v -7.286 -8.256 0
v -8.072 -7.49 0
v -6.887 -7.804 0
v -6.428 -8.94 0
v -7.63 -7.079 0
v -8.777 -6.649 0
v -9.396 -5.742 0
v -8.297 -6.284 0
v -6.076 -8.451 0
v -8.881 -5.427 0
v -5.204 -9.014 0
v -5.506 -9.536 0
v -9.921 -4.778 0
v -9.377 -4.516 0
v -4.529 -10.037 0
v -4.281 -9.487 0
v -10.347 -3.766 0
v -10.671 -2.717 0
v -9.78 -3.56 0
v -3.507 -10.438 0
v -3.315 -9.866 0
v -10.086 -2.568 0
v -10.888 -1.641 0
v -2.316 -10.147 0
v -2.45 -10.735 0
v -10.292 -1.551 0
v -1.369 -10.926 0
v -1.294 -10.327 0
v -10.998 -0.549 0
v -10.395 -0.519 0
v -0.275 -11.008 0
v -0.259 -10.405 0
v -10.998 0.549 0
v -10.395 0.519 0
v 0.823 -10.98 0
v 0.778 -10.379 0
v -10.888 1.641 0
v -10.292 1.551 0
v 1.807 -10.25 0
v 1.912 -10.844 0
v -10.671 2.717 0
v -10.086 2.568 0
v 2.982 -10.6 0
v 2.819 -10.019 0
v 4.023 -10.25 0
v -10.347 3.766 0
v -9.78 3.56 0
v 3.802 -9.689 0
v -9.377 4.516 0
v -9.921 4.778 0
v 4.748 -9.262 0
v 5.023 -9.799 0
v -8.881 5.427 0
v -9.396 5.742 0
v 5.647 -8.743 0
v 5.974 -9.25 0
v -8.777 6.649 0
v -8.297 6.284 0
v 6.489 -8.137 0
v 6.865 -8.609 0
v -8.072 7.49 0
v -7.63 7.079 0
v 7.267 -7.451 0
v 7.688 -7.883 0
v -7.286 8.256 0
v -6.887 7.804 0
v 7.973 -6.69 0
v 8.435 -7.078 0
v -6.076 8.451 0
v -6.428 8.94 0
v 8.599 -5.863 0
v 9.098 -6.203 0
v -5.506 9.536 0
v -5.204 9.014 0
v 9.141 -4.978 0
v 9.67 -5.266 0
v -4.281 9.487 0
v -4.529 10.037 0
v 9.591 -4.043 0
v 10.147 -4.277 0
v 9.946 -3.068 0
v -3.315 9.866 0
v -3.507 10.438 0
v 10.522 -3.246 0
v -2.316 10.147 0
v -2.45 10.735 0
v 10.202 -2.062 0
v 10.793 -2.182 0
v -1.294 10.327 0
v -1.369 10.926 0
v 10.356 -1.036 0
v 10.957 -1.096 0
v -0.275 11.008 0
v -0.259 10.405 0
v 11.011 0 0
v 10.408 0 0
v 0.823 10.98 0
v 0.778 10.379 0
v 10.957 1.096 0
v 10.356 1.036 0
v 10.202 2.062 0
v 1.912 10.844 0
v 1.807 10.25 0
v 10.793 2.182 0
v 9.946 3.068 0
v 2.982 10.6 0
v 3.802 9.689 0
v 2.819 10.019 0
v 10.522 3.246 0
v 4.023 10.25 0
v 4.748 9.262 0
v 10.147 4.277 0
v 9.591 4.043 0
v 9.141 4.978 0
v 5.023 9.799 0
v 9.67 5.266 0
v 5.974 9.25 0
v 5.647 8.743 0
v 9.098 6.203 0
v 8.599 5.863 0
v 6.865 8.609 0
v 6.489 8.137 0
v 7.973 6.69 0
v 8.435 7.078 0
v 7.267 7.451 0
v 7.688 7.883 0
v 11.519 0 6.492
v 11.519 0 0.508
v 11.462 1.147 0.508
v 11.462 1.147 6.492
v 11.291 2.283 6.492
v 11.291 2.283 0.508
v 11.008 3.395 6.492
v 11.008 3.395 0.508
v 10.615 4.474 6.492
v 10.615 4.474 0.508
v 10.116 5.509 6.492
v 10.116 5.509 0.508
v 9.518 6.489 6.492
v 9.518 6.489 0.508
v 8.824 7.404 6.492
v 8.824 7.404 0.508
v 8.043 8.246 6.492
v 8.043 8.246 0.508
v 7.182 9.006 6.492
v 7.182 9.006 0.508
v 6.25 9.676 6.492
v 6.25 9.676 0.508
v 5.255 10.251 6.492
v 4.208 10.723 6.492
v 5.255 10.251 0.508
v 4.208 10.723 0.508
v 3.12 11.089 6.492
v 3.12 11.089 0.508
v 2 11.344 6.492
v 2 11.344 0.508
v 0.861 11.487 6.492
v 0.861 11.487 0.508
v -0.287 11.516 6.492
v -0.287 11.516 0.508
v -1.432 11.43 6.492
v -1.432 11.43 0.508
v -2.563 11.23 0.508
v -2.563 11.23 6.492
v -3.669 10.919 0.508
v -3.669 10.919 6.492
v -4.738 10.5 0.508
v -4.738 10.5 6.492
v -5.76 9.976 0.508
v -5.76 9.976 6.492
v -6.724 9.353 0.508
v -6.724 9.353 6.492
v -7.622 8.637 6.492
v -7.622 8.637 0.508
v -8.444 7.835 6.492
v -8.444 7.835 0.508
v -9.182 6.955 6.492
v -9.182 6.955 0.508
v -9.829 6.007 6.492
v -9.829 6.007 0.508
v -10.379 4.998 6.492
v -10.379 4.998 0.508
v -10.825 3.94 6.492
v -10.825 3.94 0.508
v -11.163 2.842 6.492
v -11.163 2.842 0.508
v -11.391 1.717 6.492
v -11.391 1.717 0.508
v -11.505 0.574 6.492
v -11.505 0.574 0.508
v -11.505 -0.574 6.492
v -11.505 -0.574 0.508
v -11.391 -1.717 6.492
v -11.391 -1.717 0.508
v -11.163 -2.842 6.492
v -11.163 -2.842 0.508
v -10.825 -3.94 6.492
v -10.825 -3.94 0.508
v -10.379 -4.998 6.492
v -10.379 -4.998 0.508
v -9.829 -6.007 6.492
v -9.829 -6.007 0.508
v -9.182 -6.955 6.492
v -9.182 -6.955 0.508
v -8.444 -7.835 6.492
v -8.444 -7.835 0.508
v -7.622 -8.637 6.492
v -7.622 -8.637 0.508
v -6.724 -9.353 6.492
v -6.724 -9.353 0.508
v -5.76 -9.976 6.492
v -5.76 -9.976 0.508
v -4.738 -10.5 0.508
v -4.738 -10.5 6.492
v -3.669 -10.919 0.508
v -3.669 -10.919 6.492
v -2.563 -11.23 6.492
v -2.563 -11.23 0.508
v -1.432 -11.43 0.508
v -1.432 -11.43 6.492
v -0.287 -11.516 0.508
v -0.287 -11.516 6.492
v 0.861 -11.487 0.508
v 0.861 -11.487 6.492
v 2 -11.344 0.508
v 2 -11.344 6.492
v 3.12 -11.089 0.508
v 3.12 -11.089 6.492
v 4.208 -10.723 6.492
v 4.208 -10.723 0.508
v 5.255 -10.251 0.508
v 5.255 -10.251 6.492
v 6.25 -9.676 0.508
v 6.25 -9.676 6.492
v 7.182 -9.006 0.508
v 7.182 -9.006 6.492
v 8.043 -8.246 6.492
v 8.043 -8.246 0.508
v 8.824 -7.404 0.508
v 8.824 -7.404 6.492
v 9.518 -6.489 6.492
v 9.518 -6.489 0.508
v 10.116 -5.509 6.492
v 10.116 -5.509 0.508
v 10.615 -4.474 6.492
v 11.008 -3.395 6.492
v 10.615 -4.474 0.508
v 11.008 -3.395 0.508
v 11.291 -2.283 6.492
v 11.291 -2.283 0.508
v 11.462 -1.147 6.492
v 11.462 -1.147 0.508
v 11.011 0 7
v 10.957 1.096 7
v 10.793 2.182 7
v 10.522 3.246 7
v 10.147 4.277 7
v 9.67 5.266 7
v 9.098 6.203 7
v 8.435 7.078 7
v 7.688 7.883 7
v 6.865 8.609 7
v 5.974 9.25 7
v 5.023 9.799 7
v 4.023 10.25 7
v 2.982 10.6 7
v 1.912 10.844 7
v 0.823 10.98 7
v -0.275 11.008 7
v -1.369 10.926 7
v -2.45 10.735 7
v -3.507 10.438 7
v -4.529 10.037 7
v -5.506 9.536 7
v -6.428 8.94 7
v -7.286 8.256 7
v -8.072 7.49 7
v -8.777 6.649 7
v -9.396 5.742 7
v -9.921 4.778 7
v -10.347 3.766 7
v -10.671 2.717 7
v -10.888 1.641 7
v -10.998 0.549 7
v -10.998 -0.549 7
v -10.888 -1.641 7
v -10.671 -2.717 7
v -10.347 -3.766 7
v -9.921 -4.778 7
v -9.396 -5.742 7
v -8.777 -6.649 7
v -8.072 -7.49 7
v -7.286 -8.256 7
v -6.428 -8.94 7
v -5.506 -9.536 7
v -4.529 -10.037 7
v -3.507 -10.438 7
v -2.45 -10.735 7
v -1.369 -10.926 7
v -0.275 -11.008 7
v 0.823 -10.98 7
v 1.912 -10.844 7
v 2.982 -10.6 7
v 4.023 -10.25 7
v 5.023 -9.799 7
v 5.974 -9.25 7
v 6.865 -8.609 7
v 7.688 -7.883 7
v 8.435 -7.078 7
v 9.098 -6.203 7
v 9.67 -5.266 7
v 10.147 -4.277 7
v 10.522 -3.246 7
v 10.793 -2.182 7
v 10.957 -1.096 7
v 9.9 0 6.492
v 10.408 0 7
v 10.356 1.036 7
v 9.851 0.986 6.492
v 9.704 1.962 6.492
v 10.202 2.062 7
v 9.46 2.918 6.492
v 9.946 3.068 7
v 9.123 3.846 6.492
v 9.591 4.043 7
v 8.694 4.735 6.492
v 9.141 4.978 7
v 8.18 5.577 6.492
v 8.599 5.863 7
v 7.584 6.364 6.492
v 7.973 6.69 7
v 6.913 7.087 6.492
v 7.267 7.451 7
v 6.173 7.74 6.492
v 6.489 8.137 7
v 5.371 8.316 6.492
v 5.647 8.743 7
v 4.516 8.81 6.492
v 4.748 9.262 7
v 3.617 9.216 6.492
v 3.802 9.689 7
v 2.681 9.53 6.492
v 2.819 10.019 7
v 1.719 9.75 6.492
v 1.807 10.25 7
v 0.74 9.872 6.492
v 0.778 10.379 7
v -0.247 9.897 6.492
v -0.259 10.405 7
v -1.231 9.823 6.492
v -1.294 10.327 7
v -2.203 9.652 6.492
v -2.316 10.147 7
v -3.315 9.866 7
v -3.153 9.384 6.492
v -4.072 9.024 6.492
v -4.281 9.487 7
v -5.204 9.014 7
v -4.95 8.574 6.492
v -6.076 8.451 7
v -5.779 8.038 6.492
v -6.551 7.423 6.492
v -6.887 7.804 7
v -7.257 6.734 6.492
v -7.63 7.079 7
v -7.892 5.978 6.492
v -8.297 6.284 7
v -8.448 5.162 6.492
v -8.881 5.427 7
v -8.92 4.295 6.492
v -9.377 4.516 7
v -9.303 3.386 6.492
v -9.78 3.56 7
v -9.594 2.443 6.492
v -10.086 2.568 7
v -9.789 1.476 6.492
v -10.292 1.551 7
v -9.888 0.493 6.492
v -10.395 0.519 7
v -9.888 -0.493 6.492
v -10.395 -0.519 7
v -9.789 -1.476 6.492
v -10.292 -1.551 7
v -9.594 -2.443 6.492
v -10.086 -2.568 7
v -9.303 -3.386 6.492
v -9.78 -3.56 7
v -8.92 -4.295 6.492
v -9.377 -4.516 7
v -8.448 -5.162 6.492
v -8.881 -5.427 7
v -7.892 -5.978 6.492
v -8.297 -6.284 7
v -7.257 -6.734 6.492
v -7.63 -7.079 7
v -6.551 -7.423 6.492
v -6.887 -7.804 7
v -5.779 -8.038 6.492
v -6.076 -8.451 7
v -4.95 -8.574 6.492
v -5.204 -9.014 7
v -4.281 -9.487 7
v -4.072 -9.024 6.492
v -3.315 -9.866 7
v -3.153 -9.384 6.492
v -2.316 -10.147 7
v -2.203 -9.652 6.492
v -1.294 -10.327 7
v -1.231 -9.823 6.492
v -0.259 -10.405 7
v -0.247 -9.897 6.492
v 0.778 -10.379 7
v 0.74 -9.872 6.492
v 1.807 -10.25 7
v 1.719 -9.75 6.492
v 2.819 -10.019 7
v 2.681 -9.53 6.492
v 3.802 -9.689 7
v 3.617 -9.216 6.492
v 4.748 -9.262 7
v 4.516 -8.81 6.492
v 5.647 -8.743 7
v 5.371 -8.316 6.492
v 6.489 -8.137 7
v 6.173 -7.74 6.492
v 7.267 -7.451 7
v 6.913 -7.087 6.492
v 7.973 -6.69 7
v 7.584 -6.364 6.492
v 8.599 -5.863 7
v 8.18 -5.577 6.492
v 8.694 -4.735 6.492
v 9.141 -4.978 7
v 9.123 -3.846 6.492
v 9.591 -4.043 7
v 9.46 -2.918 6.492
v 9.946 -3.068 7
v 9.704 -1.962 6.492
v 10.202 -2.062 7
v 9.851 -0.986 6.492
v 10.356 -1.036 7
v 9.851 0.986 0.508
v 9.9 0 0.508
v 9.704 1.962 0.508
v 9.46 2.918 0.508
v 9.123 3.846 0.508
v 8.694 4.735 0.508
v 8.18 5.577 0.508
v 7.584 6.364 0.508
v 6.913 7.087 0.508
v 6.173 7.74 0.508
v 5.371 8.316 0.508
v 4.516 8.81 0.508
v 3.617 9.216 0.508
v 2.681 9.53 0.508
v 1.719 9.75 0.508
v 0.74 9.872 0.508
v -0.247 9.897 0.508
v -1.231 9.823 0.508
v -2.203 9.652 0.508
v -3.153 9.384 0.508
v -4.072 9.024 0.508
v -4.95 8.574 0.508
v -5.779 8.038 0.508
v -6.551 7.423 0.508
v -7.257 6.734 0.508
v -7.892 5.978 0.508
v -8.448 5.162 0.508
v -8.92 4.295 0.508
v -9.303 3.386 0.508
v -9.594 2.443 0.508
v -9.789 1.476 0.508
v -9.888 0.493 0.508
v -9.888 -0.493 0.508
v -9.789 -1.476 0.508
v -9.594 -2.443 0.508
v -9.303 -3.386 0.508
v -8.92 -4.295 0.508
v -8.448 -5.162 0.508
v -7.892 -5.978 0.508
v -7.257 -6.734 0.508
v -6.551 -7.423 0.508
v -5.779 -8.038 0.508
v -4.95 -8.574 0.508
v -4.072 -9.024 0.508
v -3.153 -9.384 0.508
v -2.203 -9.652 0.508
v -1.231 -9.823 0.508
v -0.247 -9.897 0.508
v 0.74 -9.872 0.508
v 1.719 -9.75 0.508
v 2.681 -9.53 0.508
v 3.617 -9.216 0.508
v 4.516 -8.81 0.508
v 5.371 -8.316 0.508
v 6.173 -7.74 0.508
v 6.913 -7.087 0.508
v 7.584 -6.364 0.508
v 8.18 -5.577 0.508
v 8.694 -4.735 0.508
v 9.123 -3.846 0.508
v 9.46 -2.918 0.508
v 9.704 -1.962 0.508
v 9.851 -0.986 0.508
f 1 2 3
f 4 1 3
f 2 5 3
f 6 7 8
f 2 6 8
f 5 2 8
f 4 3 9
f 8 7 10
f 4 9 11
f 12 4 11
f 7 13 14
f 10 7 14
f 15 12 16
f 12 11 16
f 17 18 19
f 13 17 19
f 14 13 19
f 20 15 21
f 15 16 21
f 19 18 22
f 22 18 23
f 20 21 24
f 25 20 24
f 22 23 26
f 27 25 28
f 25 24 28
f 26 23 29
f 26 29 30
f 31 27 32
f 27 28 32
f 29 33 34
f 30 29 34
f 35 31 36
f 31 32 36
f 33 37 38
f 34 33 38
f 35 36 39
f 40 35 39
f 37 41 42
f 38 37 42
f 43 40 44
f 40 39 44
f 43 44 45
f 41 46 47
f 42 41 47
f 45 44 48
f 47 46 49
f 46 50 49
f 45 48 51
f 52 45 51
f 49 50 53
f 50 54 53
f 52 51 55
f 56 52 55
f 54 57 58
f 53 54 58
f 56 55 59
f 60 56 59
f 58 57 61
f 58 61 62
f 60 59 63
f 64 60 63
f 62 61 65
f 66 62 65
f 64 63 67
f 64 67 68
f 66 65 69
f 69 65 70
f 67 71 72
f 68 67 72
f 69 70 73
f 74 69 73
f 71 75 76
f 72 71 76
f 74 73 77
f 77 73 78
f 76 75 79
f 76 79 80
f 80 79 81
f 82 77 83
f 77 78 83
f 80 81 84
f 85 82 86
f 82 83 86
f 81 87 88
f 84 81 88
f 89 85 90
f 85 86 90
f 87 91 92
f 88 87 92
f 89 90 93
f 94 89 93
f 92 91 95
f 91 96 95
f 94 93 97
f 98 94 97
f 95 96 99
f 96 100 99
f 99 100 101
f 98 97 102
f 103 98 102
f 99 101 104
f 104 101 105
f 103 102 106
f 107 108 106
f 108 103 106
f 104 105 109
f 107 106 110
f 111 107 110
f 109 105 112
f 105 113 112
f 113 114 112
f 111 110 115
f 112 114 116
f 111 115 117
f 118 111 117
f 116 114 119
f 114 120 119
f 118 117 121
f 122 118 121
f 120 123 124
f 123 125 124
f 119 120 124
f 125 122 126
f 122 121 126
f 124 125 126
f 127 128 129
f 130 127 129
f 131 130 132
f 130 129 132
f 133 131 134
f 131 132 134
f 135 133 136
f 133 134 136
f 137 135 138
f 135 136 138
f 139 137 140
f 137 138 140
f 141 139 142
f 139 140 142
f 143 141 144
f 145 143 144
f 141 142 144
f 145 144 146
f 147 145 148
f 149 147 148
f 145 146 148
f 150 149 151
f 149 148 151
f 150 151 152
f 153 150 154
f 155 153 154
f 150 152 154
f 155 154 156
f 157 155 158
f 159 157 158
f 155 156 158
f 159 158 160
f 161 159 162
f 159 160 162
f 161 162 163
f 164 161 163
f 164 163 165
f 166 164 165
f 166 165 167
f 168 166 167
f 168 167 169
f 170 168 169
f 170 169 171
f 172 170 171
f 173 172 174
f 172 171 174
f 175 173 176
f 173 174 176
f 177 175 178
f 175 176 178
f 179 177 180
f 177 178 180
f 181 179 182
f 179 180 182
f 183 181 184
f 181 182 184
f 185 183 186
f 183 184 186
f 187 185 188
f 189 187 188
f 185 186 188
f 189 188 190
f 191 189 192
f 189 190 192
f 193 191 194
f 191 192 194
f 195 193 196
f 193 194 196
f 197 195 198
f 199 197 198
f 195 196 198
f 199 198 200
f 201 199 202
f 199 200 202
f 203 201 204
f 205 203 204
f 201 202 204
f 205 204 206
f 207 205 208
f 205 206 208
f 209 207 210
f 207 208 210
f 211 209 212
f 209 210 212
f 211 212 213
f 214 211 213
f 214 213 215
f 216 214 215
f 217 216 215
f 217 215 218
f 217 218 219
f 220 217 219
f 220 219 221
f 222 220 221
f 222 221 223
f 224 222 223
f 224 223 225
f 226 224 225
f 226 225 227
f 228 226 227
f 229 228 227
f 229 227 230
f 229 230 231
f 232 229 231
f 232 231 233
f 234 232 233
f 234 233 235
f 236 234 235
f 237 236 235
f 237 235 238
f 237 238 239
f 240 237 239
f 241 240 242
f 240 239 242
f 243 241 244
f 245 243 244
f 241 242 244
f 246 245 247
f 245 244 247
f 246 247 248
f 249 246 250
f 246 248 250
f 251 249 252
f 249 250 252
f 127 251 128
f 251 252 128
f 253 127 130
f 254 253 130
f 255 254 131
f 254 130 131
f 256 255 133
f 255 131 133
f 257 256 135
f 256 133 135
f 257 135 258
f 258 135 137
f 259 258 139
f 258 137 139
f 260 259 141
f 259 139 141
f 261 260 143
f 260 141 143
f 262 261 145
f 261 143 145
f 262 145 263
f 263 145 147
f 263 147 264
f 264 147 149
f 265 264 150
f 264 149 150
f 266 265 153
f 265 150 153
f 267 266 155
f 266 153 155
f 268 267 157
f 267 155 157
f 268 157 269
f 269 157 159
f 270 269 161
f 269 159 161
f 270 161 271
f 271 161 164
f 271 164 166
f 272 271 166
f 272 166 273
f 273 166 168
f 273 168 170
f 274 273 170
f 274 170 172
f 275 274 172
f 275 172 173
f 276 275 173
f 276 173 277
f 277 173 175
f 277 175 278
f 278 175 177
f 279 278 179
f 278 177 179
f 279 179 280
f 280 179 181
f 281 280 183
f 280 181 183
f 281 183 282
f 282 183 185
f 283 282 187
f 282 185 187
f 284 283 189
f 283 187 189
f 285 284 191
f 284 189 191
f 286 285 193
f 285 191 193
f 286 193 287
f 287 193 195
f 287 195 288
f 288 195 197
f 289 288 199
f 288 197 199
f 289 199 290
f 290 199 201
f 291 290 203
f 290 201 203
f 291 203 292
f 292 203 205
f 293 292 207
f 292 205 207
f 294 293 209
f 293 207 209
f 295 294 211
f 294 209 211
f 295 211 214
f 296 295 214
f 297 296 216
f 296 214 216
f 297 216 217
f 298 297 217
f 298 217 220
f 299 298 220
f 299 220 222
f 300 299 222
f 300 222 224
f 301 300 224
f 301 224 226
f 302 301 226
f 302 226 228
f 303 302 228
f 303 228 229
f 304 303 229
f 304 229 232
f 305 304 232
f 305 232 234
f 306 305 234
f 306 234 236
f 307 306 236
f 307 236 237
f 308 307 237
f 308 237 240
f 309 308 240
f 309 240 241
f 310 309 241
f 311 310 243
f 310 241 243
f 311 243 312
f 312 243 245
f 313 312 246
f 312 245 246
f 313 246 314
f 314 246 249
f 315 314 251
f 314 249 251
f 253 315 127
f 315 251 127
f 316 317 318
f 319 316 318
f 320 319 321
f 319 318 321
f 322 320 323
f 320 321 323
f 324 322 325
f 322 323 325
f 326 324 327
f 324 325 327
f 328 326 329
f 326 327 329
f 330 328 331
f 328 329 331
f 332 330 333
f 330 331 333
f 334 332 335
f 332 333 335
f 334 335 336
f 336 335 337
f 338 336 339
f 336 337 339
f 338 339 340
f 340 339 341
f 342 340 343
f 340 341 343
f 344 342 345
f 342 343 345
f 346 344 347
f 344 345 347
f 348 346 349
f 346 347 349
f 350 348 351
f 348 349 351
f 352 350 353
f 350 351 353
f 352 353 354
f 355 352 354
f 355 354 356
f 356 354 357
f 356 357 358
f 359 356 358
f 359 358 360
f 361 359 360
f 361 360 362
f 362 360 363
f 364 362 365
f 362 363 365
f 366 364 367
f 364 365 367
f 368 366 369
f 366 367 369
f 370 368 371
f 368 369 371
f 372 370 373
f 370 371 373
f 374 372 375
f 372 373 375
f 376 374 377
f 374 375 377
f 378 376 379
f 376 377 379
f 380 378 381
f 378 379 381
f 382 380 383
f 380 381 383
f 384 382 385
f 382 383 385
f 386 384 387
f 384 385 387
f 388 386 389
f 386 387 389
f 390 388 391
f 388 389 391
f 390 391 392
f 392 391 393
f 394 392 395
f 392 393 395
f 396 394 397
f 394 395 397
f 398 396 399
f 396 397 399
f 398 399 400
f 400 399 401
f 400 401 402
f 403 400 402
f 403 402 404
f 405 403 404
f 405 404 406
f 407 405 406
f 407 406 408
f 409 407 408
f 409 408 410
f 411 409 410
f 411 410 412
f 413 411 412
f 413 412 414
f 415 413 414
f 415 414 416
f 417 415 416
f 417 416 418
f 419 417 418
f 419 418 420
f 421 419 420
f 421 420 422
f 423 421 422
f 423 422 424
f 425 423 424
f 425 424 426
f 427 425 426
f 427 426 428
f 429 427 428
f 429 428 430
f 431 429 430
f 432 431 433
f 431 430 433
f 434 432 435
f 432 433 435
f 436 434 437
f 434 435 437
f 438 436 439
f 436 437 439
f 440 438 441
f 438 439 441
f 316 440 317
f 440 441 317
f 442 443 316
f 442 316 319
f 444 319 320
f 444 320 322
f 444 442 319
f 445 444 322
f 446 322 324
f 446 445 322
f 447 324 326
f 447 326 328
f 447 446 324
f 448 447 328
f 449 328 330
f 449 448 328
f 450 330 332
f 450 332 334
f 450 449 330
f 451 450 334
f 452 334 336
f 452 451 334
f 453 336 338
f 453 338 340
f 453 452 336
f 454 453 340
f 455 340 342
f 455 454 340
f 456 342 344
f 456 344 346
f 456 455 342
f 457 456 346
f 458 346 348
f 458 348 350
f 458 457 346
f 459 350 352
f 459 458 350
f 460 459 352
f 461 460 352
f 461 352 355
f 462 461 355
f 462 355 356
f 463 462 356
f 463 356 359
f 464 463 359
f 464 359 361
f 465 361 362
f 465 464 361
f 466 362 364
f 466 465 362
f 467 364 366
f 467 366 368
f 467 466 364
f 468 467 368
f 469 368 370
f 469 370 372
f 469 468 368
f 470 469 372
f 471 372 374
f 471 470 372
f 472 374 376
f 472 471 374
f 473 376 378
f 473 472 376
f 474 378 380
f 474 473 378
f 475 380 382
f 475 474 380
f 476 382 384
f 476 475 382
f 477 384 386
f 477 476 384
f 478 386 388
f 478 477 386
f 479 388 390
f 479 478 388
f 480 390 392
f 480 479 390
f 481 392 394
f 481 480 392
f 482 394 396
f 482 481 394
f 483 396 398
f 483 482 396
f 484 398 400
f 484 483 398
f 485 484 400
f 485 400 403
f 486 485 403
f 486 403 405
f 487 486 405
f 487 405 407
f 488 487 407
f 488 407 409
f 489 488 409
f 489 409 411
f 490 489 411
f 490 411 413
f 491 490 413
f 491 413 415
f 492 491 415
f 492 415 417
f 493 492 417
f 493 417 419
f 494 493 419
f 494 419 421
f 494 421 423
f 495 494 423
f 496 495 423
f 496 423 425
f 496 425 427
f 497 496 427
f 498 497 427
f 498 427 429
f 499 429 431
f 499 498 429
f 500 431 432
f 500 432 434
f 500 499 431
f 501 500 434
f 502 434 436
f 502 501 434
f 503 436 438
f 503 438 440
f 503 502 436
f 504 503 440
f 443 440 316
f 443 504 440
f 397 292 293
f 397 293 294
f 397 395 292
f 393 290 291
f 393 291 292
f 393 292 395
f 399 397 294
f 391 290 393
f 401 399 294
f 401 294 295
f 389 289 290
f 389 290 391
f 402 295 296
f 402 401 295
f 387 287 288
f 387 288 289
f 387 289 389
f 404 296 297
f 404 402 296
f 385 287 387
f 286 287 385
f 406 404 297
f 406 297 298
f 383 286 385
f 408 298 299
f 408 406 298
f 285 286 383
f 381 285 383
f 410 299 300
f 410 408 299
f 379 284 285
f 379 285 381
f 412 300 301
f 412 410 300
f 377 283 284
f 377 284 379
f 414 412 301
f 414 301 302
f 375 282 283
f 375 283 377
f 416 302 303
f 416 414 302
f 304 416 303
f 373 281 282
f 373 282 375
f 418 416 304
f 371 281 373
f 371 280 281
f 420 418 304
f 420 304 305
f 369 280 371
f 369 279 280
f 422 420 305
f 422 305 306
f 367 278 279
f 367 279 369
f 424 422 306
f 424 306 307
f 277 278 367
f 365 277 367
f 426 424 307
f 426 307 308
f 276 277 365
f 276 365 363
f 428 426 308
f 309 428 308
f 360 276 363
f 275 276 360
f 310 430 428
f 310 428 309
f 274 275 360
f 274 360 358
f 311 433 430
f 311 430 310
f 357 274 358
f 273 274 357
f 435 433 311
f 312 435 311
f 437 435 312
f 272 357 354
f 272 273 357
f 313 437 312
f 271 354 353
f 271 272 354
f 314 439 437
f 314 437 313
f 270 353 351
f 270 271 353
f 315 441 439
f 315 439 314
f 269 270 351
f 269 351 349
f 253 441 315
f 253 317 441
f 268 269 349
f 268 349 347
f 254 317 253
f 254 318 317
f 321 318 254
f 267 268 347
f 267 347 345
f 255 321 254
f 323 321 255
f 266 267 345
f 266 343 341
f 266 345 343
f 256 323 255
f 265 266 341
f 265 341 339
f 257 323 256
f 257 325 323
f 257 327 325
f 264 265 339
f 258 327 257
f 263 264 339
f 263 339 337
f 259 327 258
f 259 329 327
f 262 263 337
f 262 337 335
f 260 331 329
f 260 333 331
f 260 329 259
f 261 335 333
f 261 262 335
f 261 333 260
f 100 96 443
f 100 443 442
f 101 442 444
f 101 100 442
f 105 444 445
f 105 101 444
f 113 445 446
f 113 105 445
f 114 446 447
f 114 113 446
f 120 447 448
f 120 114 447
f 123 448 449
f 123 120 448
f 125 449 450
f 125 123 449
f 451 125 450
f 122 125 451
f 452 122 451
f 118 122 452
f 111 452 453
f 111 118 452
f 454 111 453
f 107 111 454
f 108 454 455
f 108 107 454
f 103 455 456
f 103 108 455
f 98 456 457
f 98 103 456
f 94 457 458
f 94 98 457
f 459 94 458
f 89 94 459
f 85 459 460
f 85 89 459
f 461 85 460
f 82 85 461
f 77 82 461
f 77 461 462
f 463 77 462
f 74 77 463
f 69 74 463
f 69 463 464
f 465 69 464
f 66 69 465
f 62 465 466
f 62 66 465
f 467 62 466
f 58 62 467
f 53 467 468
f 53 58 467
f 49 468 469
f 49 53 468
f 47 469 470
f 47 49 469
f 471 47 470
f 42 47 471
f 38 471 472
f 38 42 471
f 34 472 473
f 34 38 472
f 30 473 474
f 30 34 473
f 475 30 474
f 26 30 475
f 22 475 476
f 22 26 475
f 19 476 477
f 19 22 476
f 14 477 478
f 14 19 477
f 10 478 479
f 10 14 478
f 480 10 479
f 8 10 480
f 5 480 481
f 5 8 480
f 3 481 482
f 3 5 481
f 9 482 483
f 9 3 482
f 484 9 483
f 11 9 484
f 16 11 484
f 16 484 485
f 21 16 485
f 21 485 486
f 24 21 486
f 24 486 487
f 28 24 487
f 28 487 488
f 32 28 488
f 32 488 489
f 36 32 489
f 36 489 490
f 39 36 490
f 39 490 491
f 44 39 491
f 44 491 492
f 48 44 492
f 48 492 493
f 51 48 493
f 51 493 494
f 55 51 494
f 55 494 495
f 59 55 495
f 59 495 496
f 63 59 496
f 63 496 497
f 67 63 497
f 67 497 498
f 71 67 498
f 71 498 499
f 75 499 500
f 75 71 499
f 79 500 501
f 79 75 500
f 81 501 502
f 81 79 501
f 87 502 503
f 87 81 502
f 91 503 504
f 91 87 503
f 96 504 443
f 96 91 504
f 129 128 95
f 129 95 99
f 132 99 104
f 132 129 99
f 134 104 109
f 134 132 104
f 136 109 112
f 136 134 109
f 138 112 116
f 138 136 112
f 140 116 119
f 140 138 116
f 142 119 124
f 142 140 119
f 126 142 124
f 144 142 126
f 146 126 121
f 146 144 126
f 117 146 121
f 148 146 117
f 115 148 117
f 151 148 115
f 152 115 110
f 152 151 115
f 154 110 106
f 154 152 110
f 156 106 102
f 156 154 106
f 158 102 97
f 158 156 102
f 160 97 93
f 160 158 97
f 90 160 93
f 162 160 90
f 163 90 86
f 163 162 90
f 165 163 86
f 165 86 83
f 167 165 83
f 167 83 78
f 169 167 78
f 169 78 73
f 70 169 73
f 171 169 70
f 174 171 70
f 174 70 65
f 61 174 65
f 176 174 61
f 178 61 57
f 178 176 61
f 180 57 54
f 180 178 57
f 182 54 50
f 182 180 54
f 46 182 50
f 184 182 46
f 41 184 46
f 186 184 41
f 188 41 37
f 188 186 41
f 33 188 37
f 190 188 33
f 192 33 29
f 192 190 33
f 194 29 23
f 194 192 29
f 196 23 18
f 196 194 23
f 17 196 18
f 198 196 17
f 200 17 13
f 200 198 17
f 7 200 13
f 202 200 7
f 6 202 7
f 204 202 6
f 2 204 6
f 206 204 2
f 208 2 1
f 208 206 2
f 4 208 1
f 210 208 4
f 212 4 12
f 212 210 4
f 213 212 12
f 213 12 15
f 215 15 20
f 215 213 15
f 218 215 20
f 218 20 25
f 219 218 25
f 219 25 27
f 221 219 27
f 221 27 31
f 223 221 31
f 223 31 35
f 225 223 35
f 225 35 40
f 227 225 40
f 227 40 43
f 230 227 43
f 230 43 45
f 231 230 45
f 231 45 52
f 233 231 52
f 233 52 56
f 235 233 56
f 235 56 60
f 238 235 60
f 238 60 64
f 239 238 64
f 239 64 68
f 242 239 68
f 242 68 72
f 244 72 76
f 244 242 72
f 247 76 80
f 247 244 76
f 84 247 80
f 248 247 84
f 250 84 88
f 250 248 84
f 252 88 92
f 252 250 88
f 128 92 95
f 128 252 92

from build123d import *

# Parameters (mm, degrees)
F0_R     = 11.519276
F0_R_2   = 9.9
F1_DEPTH = 7
F2_SIZE  = 0.508
F3_SIZE  = 0.508


with BuildPart() as f1:
    # F0 (on Top) → F1 (new body)
    with BuildSketch(Plane.XY):
        Circle(F0_R)
        Circle(F0_R_2, mode=Mode.SUBTRACT)
    extrude(amount=F1_DEPTH)

    # F2
    f2_edges = [f1.edges().sort_by_distance(p)[0] for p in [
        (-9.9, 0, 0),
        (-9.9, 0, 7),
    ]]
    chamfer(f2_edges, length=F2_SIZE)

    # F3
    f3_edges = [f1.edges().sort_by_distance(p)[0] for p in [
        (-11.519276, 0, 7),
        (-11.519276, 0, 0),
    ]]
    chamfer(f3_edges, length=F3_SIZE)


solid = f1.part
